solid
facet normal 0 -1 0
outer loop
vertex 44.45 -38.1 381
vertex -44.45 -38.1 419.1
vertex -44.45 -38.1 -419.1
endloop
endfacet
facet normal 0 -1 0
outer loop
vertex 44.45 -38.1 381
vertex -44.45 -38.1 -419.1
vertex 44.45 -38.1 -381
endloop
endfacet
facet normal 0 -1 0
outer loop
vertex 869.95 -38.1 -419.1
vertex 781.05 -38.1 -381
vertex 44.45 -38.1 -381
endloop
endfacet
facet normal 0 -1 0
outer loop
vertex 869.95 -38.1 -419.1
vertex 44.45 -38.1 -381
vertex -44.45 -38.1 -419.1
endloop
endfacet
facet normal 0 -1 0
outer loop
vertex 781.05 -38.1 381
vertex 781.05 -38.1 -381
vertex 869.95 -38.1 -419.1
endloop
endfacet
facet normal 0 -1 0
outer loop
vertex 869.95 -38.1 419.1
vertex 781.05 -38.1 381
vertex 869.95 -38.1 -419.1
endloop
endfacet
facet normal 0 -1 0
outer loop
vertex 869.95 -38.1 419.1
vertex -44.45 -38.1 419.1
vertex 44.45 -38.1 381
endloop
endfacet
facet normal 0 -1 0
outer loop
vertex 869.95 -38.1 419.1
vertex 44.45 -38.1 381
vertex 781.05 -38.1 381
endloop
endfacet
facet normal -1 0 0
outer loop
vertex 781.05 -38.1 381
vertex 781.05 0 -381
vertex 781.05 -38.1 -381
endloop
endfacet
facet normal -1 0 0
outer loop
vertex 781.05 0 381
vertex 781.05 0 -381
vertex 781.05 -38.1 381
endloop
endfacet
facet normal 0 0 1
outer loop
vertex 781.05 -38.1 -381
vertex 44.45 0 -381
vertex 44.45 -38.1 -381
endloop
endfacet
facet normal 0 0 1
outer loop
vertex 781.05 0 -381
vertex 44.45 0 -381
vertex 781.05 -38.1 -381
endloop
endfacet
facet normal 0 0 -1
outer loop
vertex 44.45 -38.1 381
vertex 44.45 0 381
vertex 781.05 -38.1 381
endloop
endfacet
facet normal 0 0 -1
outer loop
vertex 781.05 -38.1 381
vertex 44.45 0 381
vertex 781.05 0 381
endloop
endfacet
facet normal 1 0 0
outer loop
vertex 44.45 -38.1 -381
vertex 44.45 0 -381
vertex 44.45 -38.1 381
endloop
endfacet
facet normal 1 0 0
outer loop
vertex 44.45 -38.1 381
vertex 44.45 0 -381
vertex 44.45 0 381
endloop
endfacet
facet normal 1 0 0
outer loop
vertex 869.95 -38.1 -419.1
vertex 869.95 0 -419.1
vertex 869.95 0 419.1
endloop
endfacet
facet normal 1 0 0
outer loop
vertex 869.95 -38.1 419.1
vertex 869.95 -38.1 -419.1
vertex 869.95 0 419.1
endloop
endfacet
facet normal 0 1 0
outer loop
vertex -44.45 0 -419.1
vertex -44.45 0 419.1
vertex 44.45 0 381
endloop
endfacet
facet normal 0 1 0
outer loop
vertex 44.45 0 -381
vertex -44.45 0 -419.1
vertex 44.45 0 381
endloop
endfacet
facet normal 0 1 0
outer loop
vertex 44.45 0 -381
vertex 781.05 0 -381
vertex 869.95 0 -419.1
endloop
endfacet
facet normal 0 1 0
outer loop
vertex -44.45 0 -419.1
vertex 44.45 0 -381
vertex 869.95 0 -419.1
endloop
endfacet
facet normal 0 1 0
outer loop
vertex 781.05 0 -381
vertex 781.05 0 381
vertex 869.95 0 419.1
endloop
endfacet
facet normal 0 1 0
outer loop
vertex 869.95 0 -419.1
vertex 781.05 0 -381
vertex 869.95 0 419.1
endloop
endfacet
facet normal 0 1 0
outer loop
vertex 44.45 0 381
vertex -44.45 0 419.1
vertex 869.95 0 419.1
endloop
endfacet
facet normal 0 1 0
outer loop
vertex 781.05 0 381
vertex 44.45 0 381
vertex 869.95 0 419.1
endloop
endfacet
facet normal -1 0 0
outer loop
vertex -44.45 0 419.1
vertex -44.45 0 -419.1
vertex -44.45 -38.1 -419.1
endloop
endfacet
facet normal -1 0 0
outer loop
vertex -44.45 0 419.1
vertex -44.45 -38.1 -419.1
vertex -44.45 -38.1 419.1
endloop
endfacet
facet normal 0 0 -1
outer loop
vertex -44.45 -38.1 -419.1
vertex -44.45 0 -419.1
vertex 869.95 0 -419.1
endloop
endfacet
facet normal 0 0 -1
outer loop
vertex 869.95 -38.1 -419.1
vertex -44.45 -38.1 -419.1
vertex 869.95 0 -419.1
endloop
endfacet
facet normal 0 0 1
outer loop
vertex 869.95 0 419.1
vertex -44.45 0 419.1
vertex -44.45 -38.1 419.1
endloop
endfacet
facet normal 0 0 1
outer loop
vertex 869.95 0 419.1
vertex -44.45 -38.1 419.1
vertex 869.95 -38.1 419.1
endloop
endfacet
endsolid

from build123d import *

# Parameters (mm, degrees)
F0_W     = 88.9
F0_H     = 762
F1_DEPTH = 38.1
F2_W     = 914.4
F2_H     = 38.1
F3_DEPTH = 38.1
F4_W     = 88.9
F4_H     = 762
F5_DEPTH = 38.1
F6_W     = 914.4
F6_H     = 38.1
F7_DEPTH = 38.1


with BuildPart() as f1:
    # F0 (on Front) → F1 (new body)
    with BuildSketch(Plane.XZ):
        Rectangle(F0_W, F0_H)
    extrude(amount=F1_DEPTH)

    # F2 (on Front) → F3 (join)
    with BuildSketch(Plane.XZ):
        with Locations((412.75, 400.05)):
            Rectangle(F2_W, F2_H)
    extrude(amount=F3_DEPTH)

    # F4 (on Front) → F5 (join)
    with BuildSketch(Plane.XZ):
        with Locations((825.5, 0)):
            Rectangle(F4_W, F4_H)
    extrude(amount=F5_DEPTH)

    # F6 (on Front) → F7 (join)
    with BuildSketch(Plane.XZ):
        with Locations((412.75, -400.05)):
            Rectangle(F6_W, F6_H)
    extrude(amount=F7_DEPTH)


solid = f1.part
